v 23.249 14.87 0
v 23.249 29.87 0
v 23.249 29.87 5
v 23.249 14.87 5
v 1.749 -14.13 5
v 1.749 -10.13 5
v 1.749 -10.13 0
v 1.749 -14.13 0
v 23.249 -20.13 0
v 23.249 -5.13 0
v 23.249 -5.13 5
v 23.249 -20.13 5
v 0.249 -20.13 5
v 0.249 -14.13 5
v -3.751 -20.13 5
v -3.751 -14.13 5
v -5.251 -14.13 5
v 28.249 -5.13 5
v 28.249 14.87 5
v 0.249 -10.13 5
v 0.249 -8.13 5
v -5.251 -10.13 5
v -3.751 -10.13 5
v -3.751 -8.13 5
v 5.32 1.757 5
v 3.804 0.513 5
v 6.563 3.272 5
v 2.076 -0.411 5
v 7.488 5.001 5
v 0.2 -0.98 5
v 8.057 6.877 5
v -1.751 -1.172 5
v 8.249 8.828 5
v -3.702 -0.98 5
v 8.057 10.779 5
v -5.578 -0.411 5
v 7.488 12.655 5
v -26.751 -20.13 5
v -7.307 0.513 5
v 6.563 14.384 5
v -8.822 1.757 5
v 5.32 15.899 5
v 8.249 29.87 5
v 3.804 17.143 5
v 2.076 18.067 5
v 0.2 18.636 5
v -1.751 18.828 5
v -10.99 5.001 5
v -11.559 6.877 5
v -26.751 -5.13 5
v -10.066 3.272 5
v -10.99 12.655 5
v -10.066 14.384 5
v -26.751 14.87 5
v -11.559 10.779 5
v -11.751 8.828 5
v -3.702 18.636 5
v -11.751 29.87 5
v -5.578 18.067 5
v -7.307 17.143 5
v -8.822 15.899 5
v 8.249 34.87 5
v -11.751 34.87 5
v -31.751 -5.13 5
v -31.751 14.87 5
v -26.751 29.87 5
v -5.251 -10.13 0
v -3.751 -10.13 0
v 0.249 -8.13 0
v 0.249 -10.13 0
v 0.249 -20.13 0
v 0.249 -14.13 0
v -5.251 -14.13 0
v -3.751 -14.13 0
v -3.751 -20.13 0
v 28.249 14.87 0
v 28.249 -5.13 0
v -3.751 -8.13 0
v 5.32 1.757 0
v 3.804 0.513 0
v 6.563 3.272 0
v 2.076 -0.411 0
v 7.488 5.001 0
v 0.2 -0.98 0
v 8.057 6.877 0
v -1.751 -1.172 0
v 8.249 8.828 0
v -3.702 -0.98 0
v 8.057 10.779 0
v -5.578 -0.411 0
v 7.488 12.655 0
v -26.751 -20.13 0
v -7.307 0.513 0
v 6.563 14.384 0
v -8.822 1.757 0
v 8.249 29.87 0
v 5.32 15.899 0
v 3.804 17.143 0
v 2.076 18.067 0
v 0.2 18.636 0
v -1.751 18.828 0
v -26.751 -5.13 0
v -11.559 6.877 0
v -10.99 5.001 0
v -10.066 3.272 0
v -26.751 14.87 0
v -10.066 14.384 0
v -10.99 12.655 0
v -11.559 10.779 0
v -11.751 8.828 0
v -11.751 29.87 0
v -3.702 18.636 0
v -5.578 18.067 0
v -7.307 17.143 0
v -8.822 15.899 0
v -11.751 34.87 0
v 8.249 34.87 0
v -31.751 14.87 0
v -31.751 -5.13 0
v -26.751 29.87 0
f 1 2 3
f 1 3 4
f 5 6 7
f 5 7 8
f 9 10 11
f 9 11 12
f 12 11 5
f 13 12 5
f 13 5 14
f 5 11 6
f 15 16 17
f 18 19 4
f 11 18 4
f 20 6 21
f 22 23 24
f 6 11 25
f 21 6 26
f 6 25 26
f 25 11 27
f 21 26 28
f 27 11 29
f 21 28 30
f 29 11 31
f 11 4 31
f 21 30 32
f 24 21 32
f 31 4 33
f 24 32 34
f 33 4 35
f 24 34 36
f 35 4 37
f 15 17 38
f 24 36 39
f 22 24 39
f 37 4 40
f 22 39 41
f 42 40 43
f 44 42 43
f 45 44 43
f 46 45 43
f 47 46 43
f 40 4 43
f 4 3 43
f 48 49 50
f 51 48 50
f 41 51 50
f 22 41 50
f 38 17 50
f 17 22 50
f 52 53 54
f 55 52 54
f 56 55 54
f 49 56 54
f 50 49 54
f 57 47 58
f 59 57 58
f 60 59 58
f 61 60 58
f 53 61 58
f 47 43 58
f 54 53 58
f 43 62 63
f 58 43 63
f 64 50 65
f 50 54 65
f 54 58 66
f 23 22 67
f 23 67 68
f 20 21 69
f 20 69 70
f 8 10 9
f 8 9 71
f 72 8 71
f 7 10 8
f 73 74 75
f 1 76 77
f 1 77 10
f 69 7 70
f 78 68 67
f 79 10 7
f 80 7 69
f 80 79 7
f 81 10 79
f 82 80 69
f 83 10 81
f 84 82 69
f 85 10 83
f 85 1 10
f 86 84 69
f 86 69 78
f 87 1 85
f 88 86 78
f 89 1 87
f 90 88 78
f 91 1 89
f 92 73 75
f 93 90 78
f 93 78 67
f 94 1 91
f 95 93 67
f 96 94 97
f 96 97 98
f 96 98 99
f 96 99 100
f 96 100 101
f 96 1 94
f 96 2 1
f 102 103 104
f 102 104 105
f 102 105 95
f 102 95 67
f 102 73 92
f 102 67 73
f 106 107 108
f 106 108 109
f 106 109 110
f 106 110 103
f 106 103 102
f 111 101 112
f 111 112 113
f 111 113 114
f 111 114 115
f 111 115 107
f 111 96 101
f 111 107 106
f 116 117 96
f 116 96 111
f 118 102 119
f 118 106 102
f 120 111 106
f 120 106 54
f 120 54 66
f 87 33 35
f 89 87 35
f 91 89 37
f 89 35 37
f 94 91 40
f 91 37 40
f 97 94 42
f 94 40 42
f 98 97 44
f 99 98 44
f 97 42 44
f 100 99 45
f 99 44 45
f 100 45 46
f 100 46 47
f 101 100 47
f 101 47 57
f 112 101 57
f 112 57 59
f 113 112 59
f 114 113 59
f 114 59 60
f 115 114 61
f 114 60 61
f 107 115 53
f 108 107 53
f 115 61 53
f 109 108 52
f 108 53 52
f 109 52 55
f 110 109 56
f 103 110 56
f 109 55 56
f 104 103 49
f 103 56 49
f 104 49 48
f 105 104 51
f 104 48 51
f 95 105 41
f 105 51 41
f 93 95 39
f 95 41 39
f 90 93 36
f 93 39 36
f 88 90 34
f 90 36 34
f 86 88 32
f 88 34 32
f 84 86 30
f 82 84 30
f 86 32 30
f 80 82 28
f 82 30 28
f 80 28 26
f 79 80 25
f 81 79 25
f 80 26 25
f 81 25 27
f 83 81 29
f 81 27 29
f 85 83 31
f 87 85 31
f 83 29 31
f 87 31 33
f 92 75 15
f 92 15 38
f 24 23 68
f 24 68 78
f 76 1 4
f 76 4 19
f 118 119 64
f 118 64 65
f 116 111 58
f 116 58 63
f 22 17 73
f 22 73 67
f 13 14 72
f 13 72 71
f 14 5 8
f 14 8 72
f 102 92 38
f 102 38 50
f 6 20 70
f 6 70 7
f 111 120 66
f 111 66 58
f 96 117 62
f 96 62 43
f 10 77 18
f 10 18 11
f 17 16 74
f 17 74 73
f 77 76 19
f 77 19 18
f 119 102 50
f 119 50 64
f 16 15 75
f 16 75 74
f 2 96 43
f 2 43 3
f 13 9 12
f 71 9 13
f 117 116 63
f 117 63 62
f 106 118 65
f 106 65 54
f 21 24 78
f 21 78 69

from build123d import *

# Parameters (mm, degrees)
BOSS_EXTRUDE1_DEPTH = 5
SKETCH3_R           = 10
CUT_EXTRUDE1_DEPTH  = 5


with BuildPart() as part:
    # Sketch2 → Boss-Extrude1 (new body)
    with BuildSketch(Plane.XY):
        Polygon((-26.751257452, 29.870014622), (-11.751257452, 29.870014622), (-11.751257452, 34.870014622), (8.248742548, 34.870014622), (8.248742548, 29.870014622), (23.248742548, 29.870014622), (23.248742548, 14.870014622), (28.248742548, 14.870014622), (28.248742548, -5.129985378), (23.248742548, -5.129985378), (23.248742548, -20.129985378), (-26.751257452, -20.129985378), (-26.751257452, -5.129985378), (-31.751257452, -5.129985378), (-31.751257452, 14.870014622), (-26.751257452, 14.870014622), align=None)
    extrude(amount=BOSS_EXTRUDE1_DEPTH)

    # Sketch3 → Cut-Extrude1 (cut)
    with BuildSketch(Plane.XY.offset(5)):
        with Locations((-1.751257452, 8.827972436)):
            Circle(SKETCH3_R)
        Polygon((-3.751257452, -20.129985378), (-3.751257452, -14.129985378), (-5.251257452, -14.129985378), (-5.251257452, -10.129985378), (-3.751257452, -10.129985378), (-3.751257452, -8.129985378), (0.248742548, -8.129985378), (0.248742548, -10.129985378), (1.748742548, -10.129985378), (1.748742548, -14.129985378), (0.248742548, -14.129985378), (0.248742548, -20.129985378), align=None)
    extrude(amount=-CUT_EXTRUDE1_DEPTH, mode=Mode.SUBTRACT)


solid = part.part
